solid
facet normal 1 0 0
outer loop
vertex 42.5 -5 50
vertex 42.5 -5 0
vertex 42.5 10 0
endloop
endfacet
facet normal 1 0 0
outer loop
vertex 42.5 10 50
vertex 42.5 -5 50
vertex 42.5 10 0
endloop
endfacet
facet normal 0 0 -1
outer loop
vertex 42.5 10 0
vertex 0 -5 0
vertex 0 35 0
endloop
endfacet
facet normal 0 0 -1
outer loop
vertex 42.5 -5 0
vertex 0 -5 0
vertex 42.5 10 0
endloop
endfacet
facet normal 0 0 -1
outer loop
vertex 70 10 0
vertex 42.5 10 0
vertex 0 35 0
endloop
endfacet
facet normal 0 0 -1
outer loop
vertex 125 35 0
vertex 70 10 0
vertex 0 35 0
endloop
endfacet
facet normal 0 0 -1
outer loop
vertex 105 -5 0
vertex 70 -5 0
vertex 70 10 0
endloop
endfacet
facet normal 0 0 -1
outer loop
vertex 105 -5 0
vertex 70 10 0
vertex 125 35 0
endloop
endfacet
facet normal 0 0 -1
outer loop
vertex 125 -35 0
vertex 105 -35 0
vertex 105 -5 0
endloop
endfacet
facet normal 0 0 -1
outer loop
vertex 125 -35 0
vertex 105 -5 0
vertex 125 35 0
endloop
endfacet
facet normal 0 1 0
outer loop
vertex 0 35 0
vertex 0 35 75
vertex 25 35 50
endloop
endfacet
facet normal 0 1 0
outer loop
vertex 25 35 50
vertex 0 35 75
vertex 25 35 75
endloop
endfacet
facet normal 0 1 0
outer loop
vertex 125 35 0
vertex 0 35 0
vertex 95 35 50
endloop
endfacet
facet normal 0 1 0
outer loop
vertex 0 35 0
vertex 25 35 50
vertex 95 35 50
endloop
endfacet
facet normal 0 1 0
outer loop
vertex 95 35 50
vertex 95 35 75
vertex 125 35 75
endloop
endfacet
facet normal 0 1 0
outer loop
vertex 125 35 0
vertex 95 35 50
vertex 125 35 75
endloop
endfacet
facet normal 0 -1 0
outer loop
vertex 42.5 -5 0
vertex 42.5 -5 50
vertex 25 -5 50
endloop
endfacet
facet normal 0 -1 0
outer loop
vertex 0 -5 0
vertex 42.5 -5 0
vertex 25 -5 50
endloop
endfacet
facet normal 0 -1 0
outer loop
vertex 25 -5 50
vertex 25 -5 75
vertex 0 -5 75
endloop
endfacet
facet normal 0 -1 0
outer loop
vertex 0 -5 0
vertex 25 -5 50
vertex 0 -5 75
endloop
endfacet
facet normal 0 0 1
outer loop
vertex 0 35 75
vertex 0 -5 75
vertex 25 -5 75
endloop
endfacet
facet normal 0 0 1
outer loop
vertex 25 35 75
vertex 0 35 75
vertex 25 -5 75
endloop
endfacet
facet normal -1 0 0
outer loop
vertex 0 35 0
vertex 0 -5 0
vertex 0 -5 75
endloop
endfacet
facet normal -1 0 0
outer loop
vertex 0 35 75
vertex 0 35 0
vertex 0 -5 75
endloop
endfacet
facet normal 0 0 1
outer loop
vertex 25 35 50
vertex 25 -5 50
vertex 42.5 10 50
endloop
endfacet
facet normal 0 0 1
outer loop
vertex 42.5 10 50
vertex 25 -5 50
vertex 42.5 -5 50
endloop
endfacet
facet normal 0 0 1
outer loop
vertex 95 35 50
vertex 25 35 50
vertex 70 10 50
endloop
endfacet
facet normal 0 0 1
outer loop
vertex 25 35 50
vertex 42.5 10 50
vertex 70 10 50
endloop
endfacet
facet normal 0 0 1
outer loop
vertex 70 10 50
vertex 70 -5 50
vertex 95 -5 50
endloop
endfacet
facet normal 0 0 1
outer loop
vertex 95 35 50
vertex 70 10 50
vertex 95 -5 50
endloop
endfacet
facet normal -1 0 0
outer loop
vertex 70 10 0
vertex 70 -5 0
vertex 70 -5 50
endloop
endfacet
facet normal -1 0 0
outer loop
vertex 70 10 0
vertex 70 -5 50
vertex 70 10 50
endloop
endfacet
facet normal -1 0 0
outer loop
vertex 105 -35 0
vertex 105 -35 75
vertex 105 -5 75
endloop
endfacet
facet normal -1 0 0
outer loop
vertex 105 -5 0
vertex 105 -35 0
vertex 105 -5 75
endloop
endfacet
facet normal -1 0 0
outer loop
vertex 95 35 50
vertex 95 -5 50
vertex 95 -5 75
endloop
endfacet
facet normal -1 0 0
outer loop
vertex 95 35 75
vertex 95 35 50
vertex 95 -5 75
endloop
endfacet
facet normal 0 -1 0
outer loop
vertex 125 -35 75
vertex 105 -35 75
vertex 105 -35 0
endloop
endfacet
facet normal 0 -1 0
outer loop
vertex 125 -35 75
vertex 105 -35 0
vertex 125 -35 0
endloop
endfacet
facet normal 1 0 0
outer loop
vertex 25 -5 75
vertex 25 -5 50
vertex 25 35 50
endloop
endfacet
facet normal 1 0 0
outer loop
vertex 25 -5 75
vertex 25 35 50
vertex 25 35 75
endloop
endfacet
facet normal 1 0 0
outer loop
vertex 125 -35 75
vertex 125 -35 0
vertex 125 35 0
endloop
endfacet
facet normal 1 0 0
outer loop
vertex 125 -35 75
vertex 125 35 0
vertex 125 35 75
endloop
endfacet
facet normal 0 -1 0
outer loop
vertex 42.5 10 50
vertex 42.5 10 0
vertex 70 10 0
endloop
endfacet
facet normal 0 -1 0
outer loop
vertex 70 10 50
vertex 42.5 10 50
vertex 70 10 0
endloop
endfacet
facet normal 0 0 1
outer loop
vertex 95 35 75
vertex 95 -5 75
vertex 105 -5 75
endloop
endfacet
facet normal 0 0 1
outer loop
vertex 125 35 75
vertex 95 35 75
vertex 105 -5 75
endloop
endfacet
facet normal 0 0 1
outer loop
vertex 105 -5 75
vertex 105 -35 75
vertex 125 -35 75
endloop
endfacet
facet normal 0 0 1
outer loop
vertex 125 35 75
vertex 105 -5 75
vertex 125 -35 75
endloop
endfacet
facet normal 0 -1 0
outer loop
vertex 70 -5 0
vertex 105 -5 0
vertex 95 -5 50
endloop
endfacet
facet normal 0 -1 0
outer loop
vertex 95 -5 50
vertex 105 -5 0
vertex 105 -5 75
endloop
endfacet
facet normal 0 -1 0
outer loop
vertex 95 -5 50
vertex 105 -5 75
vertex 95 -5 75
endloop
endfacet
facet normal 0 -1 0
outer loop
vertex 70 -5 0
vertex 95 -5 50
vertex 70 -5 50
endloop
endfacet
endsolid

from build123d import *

# Parameters (mm, degrees)
F0_W     = 125
F0_H     = 75
F1_DEPTH = 35
F2_W     = 70
F2_H     = 25
F3_DEPTH = 70.001
F4_W     = 27.5
F4_H     = 15
F5_DEPTH = 75.001


with BuildPart() as f1:
    # F0 (on Front) → F1 (new body, symmetric)
    with BuildSketch(Plane.XZ):
        with Locations((62.5, 37.5)):
            Rectangle(F0_W, F0_H)
    extrude(amount=F1_DEPTH, both=True)

    # F2 (on face) → F3 (cut, through all)
    with BuildSketch(Plane.XZ.offset(35)):
        with Locations((60, 62.5)):
            Rectangle(F2_W, F2_H)
    extrude(amount=-F3_DEPTH, mode=Mode.SUBTRACT)

    # F4 (on face) → F5 (cut, through all)
    with BuildSketch(Plane.XY.offset(75)):
        Polygon((0, -5), (0, -35), (105, -35), (105, -5), (70, -5), (42.5, -5), align=None)
        with Locations((56.25, 2.5)):
            Rectangle(F4_W, F4_H)
    extrude(amount=-F5_DEPTH, mode=Mode.SUBTRACT)


solid = f1.part
